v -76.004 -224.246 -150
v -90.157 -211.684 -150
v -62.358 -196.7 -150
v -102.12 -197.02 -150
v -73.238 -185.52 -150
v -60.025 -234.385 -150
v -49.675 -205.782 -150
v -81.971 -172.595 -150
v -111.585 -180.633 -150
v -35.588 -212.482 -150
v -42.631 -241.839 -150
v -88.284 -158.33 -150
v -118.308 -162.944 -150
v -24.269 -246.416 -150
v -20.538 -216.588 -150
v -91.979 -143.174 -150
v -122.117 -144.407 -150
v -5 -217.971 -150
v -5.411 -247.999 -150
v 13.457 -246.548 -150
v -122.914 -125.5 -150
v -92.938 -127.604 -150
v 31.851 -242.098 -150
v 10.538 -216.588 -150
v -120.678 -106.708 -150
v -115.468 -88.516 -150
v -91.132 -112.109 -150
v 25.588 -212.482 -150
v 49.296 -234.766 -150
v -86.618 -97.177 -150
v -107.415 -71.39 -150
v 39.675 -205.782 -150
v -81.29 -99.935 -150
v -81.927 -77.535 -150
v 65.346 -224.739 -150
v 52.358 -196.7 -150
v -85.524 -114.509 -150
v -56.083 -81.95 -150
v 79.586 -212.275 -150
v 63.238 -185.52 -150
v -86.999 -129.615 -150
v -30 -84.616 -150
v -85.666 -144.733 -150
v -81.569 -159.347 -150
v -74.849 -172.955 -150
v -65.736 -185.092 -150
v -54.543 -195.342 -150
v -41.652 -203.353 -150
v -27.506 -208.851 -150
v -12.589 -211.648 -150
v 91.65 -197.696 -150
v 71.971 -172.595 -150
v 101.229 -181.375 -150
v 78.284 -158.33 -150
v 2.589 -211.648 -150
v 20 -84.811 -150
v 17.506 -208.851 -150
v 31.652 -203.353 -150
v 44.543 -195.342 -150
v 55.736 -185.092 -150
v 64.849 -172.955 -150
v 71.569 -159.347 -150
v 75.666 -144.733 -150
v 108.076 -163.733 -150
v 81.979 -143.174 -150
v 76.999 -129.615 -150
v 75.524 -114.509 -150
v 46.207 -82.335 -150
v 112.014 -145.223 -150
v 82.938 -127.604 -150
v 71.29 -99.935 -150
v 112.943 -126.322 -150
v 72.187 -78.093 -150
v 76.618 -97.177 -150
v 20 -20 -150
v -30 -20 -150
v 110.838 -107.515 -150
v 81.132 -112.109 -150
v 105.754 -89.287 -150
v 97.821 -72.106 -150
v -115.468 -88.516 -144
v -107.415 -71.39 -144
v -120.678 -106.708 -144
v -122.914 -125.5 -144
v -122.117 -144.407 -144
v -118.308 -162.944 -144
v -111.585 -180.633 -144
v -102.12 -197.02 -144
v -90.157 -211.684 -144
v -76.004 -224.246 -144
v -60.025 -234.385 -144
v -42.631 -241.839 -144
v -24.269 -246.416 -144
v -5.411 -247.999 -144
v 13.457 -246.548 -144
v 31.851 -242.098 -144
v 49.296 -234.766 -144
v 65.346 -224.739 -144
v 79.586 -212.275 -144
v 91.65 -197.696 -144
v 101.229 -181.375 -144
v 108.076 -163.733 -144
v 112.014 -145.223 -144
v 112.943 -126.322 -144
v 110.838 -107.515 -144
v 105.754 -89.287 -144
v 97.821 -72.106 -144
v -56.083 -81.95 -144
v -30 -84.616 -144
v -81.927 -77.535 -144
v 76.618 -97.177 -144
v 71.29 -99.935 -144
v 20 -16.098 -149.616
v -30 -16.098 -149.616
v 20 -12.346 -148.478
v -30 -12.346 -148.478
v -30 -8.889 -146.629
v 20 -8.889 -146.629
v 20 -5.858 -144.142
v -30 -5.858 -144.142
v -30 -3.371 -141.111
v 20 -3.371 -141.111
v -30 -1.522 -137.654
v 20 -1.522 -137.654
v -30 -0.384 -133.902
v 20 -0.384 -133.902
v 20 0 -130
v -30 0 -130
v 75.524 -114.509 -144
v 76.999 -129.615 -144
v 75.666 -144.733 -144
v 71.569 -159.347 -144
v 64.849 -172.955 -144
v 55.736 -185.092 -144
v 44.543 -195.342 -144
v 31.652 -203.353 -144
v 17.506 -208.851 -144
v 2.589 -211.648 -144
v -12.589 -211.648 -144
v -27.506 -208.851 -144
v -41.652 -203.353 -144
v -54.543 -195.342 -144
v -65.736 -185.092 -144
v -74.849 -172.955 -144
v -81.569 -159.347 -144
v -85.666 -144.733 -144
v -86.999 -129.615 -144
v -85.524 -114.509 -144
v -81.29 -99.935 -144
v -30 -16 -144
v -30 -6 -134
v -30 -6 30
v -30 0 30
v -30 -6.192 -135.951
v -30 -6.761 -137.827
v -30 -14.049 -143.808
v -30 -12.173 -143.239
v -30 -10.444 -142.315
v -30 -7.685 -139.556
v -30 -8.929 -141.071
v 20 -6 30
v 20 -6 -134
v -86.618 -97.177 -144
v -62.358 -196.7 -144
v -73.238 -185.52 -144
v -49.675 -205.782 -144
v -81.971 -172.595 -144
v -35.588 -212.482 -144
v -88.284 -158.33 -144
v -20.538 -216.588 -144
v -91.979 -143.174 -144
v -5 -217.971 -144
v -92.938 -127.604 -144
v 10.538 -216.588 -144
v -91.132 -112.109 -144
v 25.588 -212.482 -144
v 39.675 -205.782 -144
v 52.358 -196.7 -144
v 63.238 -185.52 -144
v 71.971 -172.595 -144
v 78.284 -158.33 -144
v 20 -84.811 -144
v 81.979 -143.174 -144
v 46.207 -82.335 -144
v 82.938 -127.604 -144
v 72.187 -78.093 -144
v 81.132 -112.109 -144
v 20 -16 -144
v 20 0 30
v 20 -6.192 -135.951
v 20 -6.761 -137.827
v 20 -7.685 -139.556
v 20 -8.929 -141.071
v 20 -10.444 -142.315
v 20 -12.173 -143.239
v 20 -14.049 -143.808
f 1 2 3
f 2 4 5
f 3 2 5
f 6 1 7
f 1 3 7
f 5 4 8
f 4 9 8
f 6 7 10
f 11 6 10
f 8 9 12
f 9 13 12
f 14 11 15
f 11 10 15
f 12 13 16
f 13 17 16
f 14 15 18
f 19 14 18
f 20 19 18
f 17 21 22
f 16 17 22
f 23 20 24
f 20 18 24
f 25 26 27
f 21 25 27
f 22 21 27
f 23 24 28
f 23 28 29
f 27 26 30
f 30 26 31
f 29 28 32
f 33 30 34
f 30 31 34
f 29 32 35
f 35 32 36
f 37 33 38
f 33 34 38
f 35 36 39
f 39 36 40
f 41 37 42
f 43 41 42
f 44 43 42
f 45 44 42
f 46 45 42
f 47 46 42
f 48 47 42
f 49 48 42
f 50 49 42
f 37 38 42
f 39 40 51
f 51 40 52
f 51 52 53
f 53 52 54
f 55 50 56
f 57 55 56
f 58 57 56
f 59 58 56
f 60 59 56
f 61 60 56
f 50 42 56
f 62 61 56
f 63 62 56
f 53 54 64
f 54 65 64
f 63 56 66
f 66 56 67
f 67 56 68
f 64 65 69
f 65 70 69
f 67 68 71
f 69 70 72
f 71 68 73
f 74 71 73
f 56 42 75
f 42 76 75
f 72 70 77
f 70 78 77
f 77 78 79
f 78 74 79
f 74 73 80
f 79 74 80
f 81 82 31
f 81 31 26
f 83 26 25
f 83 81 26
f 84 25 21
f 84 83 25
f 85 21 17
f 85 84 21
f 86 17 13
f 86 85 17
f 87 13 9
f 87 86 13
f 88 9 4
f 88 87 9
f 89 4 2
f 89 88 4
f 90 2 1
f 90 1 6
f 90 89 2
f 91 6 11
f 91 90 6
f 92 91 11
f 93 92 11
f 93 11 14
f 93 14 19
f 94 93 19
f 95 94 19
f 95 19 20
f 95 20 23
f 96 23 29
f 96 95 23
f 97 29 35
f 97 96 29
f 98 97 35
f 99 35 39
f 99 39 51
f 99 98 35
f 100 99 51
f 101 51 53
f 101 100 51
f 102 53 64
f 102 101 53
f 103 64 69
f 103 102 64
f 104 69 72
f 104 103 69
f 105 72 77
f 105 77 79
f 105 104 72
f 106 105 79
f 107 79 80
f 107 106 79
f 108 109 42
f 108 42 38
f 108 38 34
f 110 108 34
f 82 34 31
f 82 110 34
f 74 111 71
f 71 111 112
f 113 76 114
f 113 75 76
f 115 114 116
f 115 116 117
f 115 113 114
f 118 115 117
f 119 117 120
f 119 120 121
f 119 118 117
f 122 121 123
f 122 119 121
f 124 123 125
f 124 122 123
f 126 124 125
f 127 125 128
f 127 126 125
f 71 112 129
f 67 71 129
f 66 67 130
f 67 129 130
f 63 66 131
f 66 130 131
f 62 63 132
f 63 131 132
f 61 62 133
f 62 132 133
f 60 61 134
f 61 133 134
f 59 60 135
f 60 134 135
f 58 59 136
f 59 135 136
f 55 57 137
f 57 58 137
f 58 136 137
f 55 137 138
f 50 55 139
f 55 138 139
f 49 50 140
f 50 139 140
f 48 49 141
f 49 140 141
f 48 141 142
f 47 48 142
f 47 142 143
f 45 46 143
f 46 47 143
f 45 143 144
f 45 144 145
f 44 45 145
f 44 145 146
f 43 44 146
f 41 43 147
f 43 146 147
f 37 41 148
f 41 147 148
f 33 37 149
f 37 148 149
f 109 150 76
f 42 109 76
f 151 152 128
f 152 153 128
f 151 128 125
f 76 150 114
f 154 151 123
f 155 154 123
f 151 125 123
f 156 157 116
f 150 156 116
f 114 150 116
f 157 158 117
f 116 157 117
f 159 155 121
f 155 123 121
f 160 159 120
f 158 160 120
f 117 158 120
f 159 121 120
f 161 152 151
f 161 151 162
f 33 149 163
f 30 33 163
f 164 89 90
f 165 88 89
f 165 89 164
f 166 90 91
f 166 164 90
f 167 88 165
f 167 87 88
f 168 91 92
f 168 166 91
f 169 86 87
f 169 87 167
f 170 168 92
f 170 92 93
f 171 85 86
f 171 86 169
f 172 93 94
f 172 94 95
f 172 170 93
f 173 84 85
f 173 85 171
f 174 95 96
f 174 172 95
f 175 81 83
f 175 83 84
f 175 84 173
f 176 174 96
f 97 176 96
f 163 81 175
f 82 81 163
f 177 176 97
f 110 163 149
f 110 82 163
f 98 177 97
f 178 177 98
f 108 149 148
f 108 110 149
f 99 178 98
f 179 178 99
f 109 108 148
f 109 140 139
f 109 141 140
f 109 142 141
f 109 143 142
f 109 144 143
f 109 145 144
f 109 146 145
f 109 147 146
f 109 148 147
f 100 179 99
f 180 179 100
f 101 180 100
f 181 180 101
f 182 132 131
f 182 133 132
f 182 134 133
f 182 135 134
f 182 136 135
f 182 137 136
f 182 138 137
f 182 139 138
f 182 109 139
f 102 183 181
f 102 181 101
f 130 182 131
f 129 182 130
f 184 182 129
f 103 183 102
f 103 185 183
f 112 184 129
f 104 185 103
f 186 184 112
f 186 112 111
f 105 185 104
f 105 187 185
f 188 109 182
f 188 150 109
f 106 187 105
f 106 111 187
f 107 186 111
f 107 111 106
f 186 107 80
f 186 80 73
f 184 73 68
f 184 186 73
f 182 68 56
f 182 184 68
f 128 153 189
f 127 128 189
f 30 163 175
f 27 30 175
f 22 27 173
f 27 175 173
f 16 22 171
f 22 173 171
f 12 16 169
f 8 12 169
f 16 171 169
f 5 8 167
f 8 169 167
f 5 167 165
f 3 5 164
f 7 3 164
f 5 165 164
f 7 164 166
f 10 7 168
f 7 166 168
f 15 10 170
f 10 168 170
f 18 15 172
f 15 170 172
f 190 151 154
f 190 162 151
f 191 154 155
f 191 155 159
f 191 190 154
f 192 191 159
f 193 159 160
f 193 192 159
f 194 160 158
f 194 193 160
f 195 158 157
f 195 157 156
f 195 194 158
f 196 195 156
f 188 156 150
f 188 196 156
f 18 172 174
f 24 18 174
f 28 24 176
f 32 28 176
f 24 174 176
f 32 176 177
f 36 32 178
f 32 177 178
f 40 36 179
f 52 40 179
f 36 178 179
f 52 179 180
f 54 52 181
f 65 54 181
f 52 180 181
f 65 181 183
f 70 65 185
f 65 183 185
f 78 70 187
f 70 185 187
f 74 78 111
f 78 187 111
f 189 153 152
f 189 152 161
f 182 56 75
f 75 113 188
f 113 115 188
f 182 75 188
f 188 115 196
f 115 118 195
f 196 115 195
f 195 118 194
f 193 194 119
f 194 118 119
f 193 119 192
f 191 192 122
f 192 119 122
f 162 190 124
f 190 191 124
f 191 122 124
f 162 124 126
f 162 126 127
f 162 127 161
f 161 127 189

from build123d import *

# Parameters (mm, degrees)
F0_W     = 50
F0_H     = 6
F2_DEPTH = 130
F0_H_2   = 100
F0_H_3   = 74
F3_DEPTH = 6
F4_R     = 20
F5_R     = 10
F7_DEPTH = 6
F9_DEPTH = 31


# Not quite as in the source:
# - a feature names something its author has since deleted; it is built from what else it names


with BuildPart() as f2:
    # F0 (on Front) → F2 (new body)
    with BuildSketch(Plane.XZ):
        with Locations((-5, -147)):
            Rectangle(F0_W, F0_H)
    extrude(amount=F2_DEPTH)

    # F0 (on Front) → F3 (join)
    with BuildSketch(Plane.XZ):
        with Locations((-5, -20)):
            Rectangle(F0_W, F0_H_2)
        with Locations((-5, -107)):
            Rectangle(F0_W, F0_H_3)
        with Locations((-5, -147)):
            Rectangle(F0_W, F0_H)
    extrude(amount=F3_DEPTH)

    # F4
    f4_edges = [f2.edges().sort_by_distance(p)[0] for p in [
        (-5, 0, -150),
    ]]
    fillet(f4_edges, radius=F4_R)

    # F5
    f5_edges = [f2.edges().sort_by_distance(p)[0] for p in [
        (-5, -6, -144),
    ]]
    fillet(f5_edges, radius=F5_R)

    # F6 (on face) → F7 (join)
    with BuildSketch(Plane.XY.offset(-144)):
        with BuildLine():
            ThreePointArc((-30, -84.6159367699), (-69.042085877, -79.9604861418), (-107.415399673, -71.3903940482))
            ThreePointArc((-107.415399673, -71.3903940482), (-5.4112498239, -247.9992833605), (97.8214378821, -72.1056832508))
            ThreePointArc((97.8214378821, -72.1056832508), (59.233233327, -80.4336085853), (20, -84.8105109003))
            Line((20, -84.8105109003), (20, -130))
            Line((20, -130), (-30, -130))
            Line((-30, -130), (-30, -84.6159367699))
        make_face()
    extrude(amount=-F7_DEPTH)

    # F8 (on face) → F9 (cut)
    with BuildSketch(Plane.XY.offset(-144)):
        with BuildLine():
            Line((-81.2895118016, -99.9348974879), (-86.618032779, -97.1768430661))
            ThreePointArc((-86.618032779, -97.1768430661), (-77.8915033239, -179.2513111401), (-5, -217.9708071228))
            ThreePointArc((-5, -217.9708071228), (67.8915033239, -179.2513111401), (76.618032779, -97.1768430661))
            Line((76.618032779, -97.1768430661), (71.2895118016, -99.9348974879))
            ThreePointArc((71.2895118016, -99.9348974879), (62.7839892821, -176.1446724661), (-5, -212))
            ThreePointArc((-5, -212), (-72.7839892821, -176.1446724661), (-81.2895118016, -99.9348974879))
        make_face()
    extrude(amount=-F9_DEPTH, mode=Mode.SUBTRACT)


solid = f2.part
